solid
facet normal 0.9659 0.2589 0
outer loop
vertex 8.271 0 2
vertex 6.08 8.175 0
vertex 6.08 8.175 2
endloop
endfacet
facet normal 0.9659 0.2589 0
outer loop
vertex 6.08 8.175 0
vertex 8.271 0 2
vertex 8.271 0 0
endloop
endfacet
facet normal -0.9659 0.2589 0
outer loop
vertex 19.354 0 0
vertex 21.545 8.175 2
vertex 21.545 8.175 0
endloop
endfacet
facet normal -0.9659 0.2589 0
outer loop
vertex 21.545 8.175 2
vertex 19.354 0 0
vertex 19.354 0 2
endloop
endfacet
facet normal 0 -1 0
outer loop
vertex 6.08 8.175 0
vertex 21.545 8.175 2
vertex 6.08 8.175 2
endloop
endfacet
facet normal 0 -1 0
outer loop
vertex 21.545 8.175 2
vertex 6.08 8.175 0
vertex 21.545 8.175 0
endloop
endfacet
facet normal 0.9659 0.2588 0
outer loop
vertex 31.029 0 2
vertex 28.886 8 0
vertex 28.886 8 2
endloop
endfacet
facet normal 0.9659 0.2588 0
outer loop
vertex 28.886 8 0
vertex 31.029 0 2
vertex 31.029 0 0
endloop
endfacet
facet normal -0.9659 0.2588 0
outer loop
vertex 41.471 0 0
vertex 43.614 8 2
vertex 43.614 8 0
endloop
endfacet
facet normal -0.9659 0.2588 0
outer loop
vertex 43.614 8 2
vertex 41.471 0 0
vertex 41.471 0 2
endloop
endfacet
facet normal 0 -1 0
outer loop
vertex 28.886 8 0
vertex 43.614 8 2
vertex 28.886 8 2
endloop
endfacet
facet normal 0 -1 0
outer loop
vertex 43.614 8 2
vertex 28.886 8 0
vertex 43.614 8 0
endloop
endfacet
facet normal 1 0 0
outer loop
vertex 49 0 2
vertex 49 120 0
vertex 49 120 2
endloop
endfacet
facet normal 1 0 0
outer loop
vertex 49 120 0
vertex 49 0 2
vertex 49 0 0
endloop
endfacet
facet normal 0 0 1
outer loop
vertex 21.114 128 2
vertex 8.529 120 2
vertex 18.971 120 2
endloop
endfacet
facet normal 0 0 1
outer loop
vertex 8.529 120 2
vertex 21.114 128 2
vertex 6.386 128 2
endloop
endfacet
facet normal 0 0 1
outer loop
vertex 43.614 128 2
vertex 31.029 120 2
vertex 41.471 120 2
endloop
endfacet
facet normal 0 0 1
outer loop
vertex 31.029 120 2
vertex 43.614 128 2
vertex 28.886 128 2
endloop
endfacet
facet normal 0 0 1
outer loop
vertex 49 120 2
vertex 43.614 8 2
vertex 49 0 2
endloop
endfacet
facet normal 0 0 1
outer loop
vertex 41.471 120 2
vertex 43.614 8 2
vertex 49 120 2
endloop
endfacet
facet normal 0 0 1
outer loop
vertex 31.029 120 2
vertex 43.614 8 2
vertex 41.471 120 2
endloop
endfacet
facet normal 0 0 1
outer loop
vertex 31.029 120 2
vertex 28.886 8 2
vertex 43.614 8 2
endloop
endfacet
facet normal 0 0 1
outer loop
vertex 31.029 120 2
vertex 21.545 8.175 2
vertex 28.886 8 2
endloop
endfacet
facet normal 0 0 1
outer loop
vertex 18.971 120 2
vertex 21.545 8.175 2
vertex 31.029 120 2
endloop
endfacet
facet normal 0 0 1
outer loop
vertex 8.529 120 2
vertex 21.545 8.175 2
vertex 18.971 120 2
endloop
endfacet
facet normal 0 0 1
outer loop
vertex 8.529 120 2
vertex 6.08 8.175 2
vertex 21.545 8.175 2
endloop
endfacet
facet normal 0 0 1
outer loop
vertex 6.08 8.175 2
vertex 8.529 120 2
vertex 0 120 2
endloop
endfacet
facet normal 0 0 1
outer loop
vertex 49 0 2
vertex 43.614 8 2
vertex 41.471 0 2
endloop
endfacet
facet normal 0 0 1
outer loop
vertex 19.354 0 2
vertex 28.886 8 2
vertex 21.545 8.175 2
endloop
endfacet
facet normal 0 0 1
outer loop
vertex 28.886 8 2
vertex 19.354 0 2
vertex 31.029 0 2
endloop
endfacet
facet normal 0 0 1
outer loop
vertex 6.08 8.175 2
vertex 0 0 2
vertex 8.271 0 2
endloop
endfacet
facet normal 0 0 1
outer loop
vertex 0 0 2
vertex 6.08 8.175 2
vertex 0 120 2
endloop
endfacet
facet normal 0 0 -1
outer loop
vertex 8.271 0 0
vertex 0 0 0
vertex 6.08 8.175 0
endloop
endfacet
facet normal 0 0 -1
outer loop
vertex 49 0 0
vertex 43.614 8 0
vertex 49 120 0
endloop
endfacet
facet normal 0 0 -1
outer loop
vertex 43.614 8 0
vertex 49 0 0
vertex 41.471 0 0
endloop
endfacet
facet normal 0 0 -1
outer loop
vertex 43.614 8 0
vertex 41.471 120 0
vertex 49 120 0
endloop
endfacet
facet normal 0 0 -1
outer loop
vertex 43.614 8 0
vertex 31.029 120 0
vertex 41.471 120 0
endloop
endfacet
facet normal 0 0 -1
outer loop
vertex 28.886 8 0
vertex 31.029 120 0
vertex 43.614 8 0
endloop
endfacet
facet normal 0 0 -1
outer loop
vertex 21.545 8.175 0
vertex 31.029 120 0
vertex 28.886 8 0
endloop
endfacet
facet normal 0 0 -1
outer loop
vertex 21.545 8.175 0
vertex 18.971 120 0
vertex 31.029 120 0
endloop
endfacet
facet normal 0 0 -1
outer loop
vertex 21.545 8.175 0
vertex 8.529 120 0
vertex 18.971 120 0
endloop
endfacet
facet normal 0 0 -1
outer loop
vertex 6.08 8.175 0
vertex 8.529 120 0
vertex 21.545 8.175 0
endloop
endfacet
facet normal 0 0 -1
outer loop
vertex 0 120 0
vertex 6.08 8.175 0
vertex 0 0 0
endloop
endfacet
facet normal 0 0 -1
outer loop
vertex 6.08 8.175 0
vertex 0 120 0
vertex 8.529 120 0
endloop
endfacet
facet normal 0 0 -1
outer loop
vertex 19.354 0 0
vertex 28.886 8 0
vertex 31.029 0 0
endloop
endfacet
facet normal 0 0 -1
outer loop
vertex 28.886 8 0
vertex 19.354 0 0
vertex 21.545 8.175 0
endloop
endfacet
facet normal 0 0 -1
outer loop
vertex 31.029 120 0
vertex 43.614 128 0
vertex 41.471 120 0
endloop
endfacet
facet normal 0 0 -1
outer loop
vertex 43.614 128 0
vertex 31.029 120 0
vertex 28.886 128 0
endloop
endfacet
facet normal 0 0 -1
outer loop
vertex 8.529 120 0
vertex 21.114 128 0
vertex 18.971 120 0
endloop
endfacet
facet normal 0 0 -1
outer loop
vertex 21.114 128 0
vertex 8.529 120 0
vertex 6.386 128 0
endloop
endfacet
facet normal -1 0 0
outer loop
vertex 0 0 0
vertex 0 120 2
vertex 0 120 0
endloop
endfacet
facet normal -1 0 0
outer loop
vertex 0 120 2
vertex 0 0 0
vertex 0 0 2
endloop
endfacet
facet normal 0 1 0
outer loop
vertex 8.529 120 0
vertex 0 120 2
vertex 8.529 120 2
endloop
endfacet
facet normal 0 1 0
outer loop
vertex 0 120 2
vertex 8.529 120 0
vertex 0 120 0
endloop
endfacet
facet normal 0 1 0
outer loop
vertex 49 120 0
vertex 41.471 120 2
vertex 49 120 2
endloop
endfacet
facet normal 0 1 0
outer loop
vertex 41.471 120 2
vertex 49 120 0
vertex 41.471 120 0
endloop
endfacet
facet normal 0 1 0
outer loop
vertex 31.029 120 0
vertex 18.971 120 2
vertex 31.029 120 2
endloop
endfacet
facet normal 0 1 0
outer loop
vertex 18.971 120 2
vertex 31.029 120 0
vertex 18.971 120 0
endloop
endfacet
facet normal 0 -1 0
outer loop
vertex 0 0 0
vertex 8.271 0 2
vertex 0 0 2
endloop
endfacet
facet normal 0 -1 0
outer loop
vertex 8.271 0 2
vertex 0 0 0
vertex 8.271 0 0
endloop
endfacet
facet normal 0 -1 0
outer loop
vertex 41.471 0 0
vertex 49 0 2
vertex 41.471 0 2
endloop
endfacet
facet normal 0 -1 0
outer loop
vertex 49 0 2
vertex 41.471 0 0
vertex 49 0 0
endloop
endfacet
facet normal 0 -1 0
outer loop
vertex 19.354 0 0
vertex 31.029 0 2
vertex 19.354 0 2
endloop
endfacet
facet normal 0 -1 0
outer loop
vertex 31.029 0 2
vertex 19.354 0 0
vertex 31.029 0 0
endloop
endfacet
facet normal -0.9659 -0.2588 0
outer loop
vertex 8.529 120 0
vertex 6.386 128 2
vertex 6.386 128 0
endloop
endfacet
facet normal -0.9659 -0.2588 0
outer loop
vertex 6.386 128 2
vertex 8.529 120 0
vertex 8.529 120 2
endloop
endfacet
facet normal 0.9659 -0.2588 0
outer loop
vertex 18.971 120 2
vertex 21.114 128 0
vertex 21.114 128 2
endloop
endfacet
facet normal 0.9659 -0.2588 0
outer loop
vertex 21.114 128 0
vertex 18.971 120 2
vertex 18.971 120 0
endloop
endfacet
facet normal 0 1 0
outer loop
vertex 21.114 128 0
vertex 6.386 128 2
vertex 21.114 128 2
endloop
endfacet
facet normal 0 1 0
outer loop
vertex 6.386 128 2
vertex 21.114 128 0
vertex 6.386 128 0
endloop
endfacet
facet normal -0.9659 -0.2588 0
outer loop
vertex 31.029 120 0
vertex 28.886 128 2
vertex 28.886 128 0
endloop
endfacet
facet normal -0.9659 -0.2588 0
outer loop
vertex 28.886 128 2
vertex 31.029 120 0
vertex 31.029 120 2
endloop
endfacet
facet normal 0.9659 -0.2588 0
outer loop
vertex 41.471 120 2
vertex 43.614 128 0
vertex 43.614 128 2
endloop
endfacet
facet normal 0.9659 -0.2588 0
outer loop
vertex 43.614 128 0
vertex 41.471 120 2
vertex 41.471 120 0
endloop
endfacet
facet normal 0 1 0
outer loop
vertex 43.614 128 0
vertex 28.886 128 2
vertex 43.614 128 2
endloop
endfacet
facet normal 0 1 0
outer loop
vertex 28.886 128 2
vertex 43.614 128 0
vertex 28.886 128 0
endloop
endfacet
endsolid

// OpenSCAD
$fa = 1;
$fs = 0.1;

panel_height = 45;
panel_length = 120;
panel_depth = 2;

wall_thickness = 2;

// 21.5 gap
// 18.5 / 2

module tray () {
    cube([
        panel_height + (wall_thickness * 2),
        panel_length,
        panel_depth
    ]);
}

module _wedge () {
    rotate([0, 0, 15])
        cube([10, 10, wall_thickness], center=true);

    translate([-2.5, 0, 0])
        rotate([0, 0, -15])
        cube([10, 10, wall_thickness], center=true);
}

module wedge () {
    difference() {
        _wedge();

        translate([0, -6, 0])
            cube([20, 5, wall_thickness + 0.002], center=true);

        translate([0, 7.25, 0])
            cube([20, 5, wall_thickness + 0.002], center=true);
    }
}


difference() {
    tray();

    translate([12.5, 4.5, (wall_thickness / 2) - 0.001])
        rotate([0, 0, 180])
        scale([1.05, 1.05, 1.1])
        wedge();

    translate([35, 4.5, (wall_thickness / 2) - 0.001])
        rotate([0, 0, 180])
        scale([1, 1, 1.1])
        wedge();
}

translate([12.5, panel_length + 4.5, wall_thickness / 2])
    rotate([0, 0, 180])
    wedge();

translate([35, panel_length + 4.5, wall_thickness / 2])
    rotate([0, 0, 180])
    wedge();
